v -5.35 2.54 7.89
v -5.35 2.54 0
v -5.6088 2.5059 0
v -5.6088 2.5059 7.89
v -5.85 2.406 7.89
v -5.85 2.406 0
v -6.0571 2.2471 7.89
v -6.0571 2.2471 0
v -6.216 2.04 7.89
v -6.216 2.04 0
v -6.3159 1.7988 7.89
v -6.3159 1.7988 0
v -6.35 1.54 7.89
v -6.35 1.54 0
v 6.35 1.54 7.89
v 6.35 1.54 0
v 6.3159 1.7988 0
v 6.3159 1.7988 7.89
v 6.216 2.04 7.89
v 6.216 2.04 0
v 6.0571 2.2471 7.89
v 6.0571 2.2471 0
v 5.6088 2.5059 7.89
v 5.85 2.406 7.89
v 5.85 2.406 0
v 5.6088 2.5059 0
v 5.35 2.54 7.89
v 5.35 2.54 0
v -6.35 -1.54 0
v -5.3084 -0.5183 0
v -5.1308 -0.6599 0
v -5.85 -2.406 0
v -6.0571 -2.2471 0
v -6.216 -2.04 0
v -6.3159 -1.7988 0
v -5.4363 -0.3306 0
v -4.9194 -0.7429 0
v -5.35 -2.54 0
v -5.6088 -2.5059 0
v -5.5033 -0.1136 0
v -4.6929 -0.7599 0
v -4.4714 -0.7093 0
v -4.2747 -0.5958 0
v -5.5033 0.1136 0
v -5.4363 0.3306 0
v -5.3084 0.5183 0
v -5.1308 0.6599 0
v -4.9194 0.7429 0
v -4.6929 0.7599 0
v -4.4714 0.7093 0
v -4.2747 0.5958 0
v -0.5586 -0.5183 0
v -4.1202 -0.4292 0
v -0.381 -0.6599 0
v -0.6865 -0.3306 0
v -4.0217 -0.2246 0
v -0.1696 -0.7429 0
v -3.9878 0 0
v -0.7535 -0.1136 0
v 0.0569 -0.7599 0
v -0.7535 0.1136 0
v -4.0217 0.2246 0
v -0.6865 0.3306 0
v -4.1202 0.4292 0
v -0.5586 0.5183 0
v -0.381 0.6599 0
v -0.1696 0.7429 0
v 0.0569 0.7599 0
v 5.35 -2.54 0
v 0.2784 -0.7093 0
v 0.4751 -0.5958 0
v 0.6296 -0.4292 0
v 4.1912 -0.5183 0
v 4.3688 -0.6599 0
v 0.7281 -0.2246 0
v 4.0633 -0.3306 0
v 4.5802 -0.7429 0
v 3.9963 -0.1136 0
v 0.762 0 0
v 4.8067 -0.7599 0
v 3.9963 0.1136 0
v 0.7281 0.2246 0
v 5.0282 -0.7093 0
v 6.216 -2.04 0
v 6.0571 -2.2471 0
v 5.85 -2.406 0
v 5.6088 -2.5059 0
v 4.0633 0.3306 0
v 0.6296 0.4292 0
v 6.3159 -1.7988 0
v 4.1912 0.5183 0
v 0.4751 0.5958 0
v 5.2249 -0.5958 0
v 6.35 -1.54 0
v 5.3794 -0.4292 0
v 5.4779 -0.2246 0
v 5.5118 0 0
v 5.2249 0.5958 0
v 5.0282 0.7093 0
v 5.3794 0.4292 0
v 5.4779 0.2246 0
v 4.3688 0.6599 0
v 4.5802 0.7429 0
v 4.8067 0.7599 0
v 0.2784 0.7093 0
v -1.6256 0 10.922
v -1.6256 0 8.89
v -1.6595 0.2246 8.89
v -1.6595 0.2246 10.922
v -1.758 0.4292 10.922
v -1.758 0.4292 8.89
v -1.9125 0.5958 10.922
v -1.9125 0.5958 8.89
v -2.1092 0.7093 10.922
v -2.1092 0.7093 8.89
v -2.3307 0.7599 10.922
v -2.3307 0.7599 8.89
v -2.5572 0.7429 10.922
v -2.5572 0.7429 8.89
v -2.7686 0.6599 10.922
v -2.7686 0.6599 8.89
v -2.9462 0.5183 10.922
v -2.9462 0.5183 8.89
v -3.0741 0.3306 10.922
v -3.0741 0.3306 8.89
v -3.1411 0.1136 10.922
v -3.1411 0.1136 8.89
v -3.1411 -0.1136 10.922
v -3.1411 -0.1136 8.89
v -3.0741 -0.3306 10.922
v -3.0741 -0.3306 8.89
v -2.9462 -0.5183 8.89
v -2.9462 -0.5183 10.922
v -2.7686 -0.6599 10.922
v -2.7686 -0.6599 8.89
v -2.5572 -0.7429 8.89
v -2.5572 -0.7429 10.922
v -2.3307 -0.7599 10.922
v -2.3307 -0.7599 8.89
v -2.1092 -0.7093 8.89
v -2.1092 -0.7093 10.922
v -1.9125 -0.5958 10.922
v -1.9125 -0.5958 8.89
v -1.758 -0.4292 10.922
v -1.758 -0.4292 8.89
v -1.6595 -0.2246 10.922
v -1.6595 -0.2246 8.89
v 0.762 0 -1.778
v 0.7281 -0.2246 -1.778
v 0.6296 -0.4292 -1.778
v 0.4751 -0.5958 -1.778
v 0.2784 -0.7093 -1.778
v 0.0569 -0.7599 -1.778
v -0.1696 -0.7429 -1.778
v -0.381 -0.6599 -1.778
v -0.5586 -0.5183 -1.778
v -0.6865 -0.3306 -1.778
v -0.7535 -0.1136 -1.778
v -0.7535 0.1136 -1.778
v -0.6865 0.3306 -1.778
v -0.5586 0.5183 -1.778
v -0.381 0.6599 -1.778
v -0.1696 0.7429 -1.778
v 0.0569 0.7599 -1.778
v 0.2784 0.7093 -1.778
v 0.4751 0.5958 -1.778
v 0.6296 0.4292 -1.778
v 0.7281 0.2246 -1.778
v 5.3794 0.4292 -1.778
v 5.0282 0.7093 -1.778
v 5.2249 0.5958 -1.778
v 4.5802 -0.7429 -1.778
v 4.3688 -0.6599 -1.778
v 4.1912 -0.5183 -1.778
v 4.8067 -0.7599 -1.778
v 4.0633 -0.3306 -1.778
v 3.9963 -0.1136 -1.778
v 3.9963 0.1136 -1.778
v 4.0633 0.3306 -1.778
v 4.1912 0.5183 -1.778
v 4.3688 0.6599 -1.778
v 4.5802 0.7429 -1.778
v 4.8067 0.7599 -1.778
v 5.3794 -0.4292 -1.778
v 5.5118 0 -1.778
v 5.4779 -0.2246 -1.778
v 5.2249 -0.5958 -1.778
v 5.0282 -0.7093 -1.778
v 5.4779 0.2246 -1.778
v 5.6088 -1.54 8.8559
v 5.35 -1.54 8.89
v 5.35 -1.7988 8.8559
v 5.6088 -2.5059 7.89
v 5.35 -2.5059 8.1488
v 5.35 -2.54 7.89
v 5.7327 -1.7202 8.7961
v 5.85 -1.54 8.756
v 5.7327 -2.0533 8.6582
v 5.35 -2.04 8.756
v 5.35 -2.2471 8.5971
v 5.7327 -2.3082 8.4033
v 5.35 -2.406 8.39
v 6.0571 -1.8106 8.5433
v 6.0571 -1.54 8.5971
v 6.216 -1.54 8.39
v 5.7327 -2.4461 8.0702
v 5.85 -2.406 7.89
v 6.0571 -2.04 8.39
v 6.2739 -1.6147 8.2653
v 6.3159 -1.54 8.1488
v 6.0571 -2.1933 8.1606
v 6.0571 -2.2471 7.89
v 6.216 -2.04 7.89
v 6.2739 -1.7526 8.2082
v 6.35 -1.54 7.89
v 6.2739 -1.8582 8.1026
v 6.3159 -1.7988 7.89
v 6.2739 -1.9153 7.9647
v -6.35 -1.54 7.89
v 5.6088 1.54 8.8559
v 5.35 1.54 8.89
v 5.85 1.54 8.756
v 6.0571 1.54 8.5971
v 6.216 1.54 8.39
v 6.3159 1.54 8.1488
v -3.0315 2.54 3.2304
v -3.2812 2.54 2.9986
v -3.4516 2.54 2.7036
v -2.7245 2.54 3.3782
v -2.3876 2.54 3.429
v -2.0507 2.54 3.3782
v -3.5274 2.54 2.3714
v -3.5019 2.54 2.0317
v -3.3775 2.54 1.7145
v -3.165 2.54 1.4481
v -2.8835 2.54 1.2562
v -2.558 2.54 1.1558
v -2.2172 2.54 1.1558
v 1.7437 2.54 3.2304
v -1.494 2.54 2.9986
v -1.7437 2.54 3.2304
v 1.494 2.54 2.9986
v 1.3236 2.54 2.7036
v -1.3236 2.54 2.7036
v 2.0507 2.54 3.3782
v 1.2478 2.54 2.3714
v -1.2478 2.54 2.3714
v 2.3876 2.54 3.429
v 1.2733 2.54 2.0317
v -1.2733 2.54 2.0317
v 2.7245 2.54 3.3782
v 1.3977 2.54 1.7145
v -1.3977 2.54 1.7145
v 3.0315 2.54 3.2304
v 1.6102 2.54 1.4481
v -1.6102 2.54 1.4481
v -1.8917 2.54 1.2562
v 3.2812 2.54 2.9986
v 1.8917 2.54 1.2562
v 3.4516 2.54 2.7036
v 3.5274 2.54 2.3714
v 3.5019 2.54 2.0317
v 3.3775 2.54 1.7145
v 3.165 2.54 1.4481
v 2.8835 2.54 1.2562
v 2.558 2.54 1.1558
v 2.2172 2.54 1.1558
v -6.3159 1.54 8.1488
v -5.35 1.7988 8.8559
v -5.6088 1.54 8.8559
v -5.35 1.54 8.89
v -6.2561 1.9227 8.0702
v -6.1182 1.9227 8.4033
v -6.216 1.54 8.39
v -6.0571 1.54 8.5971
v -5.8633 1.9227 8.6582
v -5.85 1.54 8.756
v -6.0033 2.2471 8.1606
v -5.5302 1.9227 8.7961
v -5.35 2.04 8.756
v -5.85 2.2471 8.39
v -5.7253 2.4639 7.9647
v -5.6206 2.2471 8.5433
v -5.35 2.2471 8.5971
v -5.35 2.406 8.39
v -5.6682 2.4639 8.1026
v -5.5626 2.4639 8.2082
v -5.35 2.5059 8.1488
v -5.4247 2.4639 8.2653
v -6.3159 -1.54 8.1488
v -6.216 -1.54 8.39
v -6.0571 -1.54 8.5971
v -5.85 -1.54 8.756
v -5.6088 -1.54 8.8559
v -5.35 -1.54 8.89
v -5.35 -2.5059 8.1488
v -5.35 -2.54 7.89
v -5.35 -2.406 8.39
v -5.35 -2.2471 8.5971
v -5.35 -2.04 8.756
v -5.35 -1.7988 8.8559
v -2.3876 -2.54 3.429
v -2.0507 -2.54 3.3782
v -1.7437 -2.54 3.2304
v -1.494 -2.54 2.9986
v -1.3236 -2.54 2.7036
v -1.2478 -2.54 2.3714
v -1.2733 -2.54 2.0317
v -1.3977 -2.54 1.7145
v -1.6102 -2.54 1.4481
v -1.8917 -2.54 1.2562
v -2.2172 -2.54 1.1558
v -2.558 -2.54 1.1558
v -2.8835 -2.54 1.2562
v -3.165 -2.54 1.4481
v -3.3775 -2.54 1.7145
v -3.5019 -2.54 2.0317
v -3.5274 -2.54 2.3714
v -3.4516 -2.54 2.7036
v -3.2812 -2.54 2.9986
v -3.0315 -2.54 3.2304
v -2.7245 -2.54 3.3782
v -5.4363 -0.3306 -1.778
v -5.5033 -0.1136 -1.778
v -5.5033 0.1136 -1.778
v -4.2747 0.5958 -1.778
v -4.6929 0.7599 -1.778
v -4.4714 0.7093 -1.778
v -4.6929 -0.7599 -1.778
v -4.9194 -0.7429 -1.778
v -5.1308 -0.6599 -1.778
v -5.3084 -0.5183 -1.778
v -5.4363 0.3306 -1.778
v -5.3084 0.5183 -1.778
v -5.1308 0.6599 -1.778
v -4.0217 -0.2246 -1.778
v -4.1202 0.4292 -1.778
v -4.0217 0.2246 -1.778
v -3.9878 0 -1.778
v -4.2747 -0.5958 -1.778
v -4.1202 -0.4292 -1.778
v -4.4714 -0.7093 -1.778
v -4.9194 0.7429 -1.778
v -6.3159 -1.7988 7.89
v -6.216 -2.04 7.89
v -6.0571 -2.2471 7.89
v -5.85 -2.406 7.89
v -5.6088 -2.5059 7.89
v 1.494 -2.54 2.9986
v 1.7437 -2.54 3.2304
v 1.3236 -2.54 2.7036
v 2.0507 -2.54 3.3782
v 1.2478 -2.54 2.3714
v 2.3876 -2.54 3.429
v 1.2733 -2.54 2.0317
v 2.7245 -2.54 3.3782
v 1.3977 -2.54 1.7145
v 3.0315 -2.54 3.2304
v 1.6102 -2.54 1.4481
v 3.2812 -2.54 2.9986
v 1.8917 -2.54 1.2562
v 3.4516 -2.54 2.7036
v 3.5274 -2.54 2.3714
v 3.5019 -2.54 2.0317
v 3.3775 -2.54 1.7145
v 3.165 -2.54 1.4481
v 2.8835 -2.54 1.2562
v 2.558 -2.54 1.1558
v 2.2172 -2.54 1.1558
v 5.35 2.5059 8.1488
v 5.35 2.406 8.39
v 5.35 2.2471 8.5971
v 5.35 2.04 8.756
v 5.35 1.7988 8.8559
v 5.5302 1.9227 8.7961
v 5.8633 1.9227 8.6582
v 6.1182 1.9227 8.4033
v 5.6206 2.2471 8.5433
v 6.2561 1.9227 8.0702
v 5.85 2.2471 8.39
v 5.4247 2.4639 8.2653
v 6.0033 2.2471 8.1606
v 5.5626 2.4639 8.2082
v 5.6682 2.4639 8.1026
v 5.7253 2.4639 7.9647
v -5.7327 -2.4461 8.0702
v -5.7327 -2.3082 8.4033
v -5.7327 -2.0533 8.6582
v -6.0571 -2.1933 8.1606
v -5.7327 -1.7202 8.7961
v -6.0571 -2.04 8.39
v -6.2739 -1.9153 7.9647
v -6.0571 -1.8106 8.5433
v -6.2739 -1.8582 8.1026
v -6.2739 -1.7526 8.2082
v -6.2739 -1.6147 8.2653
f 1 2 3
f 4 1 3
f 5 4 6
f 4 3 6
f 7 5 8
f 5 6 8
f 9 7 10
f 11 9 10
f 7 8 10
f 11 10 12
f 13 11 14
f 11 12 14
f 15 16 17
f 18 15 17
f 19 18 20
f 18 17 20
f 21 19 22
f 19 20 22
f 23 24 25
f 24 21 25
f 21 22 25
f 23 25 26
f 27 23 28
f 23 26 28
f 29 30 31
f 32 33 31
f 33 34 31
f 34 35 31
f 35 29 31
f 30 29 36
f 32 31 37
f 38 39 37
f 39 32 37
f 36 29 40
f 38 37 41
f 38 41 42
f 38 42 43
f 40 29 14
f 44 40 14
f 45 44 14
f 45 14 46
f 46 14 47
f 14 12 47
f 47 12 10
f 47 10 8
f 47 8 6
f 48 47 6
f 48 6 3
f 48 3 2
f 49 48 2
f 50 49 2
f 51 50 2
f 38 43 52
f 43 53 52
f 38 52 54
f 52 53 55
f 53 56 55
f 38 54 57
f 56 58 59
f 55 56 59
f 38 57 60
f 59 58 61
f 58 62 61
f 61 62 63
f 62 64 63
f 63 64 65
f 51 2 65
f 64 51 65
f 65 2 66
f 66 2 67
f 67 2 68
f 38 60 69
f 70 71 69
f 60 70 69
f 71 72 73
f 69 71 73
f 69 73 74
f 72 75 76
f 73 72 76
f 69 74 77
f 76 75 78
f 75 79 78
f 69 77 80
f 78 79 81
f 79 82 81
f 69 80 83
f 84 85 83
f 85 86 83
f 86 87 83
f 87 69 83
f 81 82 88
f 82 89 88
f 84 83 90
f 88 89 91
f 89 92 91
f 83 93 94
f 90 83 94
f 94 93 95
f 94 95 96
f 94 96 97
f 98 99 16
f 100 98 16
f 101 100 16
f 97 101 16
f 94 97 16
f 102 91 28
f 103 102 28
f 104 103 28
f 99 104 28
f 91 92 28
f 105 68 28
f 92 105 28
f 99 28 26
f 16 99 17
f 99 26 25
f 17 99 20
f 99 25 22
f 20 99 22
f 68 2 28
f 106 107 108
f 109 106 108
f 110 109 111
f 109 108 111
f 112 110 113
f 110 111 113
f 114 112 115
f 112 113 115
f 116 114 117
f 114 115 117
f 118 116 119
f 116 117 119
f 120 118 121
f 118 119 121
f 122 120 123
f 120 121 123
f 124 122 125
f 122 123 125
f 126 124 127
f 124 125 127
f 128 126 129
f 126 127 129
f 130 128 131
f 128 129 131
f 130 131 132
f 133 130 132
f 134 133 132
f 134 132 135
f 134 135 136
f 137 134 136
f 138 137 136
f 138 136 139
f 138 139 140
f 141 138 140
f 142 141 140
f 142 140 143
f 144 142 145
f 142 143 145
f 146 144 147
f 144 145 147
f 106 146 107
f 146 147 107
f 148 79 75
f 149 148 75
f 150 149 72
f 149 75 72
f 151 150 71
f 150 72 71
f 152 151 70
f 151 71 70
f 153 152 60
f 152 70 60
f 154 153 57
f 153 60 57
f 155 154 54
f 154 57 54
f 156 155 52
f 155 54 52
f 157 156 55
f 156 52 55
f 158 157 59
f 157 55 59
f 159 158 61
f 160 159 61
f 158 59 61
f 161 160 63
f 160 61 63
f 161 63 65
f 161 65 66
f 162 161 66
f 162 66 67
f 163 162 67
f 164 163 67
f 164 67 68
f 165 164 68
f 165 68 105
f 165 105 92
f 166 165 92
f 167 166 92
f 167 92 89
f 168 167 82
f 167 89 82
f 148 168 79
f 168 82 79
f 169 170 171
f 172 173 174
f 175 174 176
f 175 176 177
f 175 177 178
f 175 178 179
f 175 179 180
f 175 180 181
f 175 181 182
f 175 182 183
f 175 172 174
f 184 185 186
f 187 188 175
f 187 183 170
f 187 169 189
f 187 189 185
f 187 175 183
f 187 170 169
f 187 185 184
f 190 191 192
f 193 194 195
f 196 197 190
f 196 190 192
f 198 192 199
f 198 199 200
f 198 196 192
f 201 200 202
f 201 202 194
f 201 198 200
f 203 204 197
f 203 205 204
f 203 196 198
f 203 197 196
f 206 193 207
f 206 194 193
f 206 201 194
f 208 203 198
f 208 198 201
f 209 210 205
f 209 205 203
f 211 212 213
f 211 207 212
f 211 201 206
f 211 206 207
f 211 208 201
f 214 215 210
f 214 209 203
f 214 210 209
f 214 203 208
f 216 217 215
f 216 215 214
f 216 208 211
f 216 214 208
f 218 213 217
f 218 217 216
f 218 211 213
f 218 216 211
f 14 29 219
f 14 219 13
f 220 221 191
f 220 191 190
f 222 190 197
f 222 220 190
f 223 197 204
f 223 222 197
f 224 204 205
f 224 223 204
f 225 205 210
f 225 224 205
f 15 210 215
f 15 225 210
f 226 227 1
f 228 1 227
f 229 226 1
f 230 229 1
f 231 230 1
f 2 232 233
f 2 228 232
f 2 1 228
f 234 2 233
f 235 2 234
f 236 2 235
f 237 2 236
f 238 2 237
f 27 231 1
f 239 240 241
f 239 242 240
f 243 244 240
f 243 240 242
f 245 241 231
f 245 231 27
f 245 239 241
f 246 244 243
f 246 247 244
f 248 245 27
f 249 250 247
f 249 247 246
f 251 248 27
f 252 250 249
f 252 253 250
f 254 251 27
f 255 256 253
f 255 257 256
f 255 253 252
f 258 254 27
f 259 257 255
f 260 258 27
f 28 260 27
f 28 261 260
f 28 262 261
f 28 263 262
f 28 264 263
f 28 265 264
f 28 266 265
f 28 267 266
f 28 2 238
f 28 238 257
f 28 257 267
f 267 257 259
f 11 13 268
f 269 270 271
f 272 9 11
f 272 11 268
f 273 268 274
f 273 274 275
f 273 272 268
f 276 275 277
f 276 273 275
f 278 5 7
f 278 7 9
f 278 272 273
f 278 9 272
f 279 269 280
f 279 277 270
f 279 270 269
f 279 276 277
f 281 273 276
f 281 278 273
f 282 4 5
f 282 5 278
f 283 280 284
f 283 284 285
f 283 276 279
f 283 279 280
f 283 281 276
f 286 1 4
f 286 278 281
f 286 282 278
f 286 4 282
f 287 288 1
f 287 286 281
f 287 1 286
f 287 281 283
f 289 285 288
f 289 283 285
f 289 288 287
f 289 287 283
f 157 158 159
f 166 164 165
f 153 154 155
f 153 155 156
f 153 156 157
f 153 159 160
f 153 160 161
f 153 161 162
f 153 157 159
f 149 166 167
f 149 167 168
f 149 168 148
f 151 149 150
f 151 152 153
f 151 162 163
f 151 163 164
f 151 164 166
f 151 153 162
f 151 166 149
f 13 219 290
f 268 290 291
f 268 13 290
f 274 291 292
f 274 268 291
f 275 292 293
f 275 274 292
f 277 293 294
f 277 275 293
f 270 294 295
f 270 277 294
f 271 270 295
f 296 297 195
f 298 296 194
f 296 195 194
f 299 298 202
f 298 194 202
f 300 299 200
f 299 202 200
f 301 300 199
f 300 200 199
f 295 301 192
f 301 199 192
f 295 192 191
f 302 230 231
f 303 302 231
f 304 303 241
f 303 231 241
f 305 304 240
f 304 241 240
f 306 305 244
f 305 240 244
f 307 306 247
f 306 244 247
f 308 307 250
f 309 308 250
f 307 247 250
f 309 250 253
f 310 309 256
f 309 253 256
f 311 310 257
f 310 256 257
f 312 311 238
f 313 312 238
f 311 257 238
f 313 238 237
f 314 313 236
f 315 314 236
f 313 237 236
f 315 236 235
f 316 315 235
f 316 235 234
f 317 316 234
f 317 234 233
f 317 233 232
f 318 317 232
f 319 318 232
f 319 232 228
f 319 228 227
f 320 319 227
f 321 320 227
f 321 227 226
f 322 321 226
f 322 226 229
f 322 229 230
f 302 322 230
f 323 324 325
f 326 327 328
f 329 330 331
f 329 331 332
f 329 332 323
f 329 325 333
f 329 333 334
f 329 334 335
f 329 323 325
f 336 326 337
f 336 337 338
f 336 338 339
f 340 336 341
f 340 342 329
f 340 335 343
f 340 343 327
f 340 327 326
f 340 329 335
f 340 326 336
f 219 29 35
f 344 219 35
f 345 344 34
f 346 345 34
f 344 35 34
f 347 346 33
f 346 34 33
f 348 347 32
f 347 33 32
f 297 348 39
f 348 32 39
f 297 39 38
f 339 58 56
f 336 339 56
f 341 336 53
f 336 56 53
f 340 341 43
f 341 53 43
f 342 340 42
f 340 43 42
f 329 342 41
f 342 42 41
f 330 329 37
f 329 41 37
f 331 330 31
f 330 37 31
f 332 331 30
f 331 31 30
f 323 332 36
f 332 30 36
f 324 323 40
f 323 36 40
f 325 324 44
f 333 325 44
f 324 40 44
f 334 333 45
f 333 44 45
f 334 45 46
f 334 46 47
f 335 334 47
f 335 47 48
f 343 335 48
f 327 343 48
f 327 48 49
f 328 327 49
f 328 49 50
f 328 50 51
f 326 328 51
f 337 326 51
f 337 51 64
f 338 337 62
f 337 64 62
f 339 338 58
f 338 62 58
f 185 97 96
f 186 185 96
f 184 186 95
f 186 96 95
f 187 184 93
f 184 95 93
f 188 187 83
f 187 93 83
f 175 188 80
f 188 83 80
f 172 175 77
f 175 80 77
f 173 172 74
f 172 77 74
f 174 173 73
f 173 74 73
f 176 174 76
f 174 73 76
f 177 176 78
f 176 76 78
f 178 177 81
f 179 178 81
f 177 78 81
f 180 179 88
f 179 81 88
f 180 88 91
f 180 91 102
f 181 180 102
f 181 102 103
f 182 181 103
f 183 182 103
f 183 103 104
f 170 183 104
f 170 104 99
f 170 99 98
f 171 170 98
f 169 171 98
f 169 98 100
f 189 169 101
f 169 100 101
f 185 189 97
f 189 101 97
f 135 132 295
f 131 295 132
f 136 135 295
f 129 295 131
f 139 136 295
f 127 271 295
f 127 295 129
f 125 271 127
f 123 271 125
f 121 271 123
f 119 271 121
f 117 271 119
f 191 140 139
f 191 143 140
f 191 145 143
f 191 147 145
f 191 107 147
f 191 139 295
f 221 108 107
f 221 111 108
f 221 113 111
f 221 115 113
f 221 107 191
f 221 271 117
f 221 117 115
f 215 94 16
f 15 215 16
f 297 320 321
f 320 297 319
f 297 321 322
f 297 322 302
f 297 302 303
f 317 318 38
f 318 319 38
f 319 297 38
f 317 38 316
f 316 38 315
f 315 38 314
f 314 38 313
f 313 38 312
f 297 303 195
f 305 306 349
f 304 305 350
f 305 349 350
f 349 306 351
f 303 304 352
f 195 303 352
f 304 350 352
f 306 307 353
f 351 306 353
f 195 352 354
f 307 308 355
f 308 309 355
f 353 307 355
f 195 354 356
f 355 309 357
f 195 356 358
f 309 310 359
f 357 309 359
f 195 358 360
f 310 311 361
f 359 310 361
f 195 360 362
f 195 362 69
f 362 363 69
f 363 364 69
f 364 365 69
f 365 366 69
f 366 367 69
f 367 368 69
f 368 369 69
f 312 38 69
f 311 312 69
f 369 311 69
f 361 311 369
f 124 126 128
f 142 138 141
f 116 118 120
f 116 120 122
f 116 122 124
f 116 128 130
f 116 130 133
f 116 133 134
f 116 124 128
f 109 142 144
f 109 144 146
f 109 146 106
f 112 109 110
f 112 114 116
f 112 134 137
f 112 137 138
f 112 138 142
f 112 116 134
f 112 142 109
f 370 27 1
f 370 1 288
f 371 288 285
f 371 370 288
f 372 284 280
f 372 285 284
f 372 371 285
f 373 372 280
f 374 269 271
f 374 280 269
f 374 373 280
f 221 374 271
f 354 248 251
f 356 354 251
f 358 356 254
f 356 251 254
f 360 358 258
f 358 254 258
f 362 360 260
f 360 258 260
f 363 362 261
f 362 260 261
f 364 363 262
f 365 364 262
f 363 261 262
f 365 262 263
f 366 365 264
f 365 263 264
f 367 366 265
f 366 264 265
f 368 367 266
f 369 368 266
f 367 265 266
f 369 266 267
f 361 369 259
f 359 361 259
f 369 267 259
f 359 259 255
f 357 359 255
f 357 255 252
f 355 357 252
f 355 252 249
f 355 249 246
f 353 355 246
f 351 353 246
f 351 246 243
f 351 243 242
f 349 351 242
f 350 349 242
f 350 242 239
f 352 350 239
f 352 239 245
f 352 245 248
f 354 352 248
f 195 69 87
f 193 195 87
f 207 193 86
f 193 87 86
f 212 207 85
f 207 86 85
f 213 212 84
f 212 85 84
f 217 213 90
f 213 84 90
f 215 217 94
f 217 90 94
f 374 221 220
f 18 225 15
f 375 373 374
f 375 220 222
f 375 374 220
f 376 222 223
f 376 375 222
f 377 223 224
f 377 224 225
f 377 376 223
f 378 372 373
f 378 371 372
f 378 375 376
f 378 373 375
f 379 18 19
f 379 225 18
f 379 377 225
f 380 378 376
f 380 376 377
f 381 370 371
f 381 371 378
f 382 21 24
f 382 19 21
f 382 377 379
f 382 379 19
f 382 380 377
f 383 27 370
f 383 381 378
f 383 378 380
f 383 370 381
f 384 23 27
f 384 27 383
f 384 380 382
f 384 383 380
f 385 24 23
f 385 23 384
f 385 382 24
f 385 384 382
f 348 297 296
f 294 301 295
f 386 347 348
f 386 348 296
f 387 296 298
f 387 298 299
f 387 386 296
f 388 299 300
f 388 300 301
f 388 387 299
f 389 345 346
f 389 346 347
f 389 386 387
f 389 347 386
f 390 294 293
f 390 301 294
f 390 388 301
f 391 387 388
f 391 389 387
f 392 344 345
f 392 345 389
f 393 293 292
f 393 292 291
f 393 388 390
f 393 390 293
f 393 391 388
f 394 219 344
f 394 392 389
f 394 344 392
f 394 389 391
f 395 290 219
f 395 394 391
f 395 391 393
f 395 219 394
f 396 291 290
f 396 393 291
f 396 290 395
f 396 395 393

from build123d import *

# Parameters (mm, degrees)
SKETCH_1_W          = 12.7
SKETCH_1_H          = 5.08
EXTRUDE_1_DEPTH     = 8.89
SKETCH_2_R          = 0.762
EXTRUDE_2_DEPTH     = 1.778
SKETCH_3_R          = 0.762
EXTRUDE_3_DEPTH     = 2.032
FILLET_2_R          = 1
FILLET_3_R          = 1
SKETCH_4_R          = 1.143
CUT_EXTRUDE_1_DEPTH = 6


with BuildPart() as part:
    # Эскиз1 → Бобышка-Вытянуть1 (new body)
    with BuildSketch(Plane.XY):
        Rectangle(SKETCH_1_W, SKETCH_1_H)
    extrude(amount=EXTRUDE_1_DEPTH)

    # Эскиз2 → Бобышка-Вытянуть2 (add)
    with BuildSketch(Plane(origin=(0, 0, 0), x_dir=(-1, 0, 0), z_dir=(0, 0, -1))):
        with Locations(Location((-4.7498, 0, 0), (0, 0, 180))):
            Circle(SKETCH_2_R)
        with Locations(Location((0, 0, 0), (0, 0, 180))):
            Circle(SKETCH_2_R)
        with Locations(Location((4.7498, 0, 0), (0, 0, 180))):
            Circle(SKETCH_2_R)
    extrude(amount=EXTRUDE_2_DEPTH)

    # Эскиз3 → Бобышка-Вытянуть3 (add)
    with BuildSketch(Plane.XY.offset(8.89)):
        with Locations((-2.3876, 0)):
            Circle(SKETCH_3_R)
    extrude(amount=EXTRUDE_3_DEPTH)

    # Скругление2
    fillet_2_edges = [part.edges().sort_by_distance(p)[0] for p in [
        (-6.35, 0, 8.89),
        (0, -2.54, 8.89),
        (6.35, 0, 8.89),
        (0, 2.54, 8.89),
    ]]
    fillet(fillet_2_edges, radius=FILLET_2_R)

    # Скругление3
    # the kernel refuses this fillet: 1 mm, written as the material it takes off along each edge
    with BuildSketch(Plane(origin=(5.35, 1.54, 7.89), x_dir=(1, 0, 0), z_dir=(0, 1, 0))) as fillet_3_piece_1_section:
        Polygon((0, 0), (FILLET_3_R, 0), (FILLET_3_R, -FILLET_3_R), (0, -FILLET_3_R), align=None)
    fillet_3_piece_1 = extrude(amount=FILLET_3_R, mode=Mode.PRIVATE)
    fillet_3_piece_1 = fillet_3_piece_1 - Plane(origin=(5.35, 1.54, 7.89), x_dir=(-0.7071067811865475, 0, -0.7071067811865475), z_dir=(0, 1, 0)) * Sphere(FILLET_3_R, mode=Mode.PRIVATE)
    add(fillet_3_piece_1, mode=Mode.SUBTRACT)
    with BuildSketch(Plane(origin=(5.35, -1.54, 7.89), x_dir=(0, -1, 0), z_dir=(1, 0, 0))) as fillet_3_piece_2_section:
        Polygon((0, 0), (FILLET_3_R, 0), (FILLET_3_R, -FILLET_3_R), (0, -FILLET_3_R), align=None)
    fillet_3_piece_2 = extrude(amount=FILLET_3_R, mode=Mode.PRIVATE)
    fillet_3_piece_2 = fillet_3_piece_2 - Plane(origin=(5.35, -1.54, 7.89), x_dir=(0, 0.7071067811865475, -0.7071067811865475), z_dir=(1, 0, 0)) * Sphere(FILLET_3_R, mode=Mode.PRIVATE)
    add(fillet_3_piece_2, mode=Mode.SUBTRACT)
    with BuildSketch(Plane(origin=(-5.35, 1.54, 7.89), x_dir=(-1, 0, 0), z_dir=(0, 1, 0))) as fillet_3_piece_3_section:
        Polygon((0, 0), (FILLET_3_R, 0), (FILLET_3_R, FILLET_3_R), (0, FILLET_3_R), align=None)
    fillet_3_piece_3 = extrude(amount=FILLET_3_R, mode=Mode.PRIVATE)
    fillet_3_piece_3 = fillet_3_piece_3 - Plane(origin=(-5.35, 1.54, 7.89), x_dir=(0.7071067811865475, 0, -0.7071067811865475), z_dir=(0, 1, 0)) * Sphere(FILLET_3_R, mode=Mode.PRIVATE)
    add(fillet_3_piece_3, mode=Mode.SUBTRACT)
    with BuildSketch(Plane(origin=(-5.35, -1.54, 7.89), x_dir=(0, -1, 0), z_dir=(-1, 0, 0))) as fillet_3_piece_4_section:
        Polygon((0, 0), (FILLET_3_R, 0), (FILLET_3_R, FILLET_3_R), (0, FILLET_3_R), align=None)
    fillet_3_piece_4 = extrude(amount=FILLET_3_R, mode=Mode.PRIVATE)
    fillet_3_piece_4 = fillet_3_piece_4 - Plane(origin=(-5.35, -1.54, 7.89), x_dir=(0, 0.7071067811865475, -0.7071067811865475), z_dir=(-1, 0, 0)) * Sphere(FILLET_3_R, mode=Mode.PRIVATE)
    add(fillet_3_piece_4, mode=Mode.SUBTRACT)
    with BuildSketch(Plane(origin=(-6.35, -2.54, -2.5), x_dir=(0, 1, 0), z_dir=(0, 0, 1)), Plane(origin=(-6.35, 2.54, -2.5), x_dir=(1, 0, 0), z_dir=(0, 0, 1))) as fillet_3_piece_5:
        with BuildLine():
            CenterArc((FILLET_3_R, -FILLET_3_R), FILLET_3_R, 90, 90)
            Line((0, -FILLET_3_R), (0, 0))
            Line((0, 0), (FILLET_3_R, 0))
        make_face()
    extrude(amount=10.39, mode=Mode.SUBTRACT)
    with BuildSketch(Plane(origin=(6.35, -2.54, -2.5), x_dir=(0, 1, 0), z_dir=(0, 0, 1)), Plane(origin=(6.35, 2.54, -2.5), x_dir=(-1, 0, 0), z_dir=(0, 0, 1))) as fillet_3_piece_6:
        with BuildLine():
            CenterArc((FILLET_3_R, FILLET_3_R), FILLET_3_R, 180, 90)
            Line((0, FILLET_3_R), (0, 0))
            Line((0, 0), (FILLET_3_R, 0))
        make_face()
    extrude(amount=10.39, mode=Mode.SUBTRACT)

    # Эскиз4 → Вырез-Вытянуть1 (cut)
    with BuildSketch(Plane(origin=(0, 2.54, 0), x_dir=(1, 0, 0), z_dir=(0, 1, 0))):
        with Locations(Location((-2.3876, -2.286, 0), (0, 0, 270))):
            Circle(SKETCH_4_R)
        with Locations(Location((2.3876, -2.286, 0), (0, 0, 270))):
            Circle(SKETCH_4_R)
    extrude(amount=-CUT_EXTRUDE_1_DEPTH, mode=Mode.SUBTRACT)


solid = part.part
